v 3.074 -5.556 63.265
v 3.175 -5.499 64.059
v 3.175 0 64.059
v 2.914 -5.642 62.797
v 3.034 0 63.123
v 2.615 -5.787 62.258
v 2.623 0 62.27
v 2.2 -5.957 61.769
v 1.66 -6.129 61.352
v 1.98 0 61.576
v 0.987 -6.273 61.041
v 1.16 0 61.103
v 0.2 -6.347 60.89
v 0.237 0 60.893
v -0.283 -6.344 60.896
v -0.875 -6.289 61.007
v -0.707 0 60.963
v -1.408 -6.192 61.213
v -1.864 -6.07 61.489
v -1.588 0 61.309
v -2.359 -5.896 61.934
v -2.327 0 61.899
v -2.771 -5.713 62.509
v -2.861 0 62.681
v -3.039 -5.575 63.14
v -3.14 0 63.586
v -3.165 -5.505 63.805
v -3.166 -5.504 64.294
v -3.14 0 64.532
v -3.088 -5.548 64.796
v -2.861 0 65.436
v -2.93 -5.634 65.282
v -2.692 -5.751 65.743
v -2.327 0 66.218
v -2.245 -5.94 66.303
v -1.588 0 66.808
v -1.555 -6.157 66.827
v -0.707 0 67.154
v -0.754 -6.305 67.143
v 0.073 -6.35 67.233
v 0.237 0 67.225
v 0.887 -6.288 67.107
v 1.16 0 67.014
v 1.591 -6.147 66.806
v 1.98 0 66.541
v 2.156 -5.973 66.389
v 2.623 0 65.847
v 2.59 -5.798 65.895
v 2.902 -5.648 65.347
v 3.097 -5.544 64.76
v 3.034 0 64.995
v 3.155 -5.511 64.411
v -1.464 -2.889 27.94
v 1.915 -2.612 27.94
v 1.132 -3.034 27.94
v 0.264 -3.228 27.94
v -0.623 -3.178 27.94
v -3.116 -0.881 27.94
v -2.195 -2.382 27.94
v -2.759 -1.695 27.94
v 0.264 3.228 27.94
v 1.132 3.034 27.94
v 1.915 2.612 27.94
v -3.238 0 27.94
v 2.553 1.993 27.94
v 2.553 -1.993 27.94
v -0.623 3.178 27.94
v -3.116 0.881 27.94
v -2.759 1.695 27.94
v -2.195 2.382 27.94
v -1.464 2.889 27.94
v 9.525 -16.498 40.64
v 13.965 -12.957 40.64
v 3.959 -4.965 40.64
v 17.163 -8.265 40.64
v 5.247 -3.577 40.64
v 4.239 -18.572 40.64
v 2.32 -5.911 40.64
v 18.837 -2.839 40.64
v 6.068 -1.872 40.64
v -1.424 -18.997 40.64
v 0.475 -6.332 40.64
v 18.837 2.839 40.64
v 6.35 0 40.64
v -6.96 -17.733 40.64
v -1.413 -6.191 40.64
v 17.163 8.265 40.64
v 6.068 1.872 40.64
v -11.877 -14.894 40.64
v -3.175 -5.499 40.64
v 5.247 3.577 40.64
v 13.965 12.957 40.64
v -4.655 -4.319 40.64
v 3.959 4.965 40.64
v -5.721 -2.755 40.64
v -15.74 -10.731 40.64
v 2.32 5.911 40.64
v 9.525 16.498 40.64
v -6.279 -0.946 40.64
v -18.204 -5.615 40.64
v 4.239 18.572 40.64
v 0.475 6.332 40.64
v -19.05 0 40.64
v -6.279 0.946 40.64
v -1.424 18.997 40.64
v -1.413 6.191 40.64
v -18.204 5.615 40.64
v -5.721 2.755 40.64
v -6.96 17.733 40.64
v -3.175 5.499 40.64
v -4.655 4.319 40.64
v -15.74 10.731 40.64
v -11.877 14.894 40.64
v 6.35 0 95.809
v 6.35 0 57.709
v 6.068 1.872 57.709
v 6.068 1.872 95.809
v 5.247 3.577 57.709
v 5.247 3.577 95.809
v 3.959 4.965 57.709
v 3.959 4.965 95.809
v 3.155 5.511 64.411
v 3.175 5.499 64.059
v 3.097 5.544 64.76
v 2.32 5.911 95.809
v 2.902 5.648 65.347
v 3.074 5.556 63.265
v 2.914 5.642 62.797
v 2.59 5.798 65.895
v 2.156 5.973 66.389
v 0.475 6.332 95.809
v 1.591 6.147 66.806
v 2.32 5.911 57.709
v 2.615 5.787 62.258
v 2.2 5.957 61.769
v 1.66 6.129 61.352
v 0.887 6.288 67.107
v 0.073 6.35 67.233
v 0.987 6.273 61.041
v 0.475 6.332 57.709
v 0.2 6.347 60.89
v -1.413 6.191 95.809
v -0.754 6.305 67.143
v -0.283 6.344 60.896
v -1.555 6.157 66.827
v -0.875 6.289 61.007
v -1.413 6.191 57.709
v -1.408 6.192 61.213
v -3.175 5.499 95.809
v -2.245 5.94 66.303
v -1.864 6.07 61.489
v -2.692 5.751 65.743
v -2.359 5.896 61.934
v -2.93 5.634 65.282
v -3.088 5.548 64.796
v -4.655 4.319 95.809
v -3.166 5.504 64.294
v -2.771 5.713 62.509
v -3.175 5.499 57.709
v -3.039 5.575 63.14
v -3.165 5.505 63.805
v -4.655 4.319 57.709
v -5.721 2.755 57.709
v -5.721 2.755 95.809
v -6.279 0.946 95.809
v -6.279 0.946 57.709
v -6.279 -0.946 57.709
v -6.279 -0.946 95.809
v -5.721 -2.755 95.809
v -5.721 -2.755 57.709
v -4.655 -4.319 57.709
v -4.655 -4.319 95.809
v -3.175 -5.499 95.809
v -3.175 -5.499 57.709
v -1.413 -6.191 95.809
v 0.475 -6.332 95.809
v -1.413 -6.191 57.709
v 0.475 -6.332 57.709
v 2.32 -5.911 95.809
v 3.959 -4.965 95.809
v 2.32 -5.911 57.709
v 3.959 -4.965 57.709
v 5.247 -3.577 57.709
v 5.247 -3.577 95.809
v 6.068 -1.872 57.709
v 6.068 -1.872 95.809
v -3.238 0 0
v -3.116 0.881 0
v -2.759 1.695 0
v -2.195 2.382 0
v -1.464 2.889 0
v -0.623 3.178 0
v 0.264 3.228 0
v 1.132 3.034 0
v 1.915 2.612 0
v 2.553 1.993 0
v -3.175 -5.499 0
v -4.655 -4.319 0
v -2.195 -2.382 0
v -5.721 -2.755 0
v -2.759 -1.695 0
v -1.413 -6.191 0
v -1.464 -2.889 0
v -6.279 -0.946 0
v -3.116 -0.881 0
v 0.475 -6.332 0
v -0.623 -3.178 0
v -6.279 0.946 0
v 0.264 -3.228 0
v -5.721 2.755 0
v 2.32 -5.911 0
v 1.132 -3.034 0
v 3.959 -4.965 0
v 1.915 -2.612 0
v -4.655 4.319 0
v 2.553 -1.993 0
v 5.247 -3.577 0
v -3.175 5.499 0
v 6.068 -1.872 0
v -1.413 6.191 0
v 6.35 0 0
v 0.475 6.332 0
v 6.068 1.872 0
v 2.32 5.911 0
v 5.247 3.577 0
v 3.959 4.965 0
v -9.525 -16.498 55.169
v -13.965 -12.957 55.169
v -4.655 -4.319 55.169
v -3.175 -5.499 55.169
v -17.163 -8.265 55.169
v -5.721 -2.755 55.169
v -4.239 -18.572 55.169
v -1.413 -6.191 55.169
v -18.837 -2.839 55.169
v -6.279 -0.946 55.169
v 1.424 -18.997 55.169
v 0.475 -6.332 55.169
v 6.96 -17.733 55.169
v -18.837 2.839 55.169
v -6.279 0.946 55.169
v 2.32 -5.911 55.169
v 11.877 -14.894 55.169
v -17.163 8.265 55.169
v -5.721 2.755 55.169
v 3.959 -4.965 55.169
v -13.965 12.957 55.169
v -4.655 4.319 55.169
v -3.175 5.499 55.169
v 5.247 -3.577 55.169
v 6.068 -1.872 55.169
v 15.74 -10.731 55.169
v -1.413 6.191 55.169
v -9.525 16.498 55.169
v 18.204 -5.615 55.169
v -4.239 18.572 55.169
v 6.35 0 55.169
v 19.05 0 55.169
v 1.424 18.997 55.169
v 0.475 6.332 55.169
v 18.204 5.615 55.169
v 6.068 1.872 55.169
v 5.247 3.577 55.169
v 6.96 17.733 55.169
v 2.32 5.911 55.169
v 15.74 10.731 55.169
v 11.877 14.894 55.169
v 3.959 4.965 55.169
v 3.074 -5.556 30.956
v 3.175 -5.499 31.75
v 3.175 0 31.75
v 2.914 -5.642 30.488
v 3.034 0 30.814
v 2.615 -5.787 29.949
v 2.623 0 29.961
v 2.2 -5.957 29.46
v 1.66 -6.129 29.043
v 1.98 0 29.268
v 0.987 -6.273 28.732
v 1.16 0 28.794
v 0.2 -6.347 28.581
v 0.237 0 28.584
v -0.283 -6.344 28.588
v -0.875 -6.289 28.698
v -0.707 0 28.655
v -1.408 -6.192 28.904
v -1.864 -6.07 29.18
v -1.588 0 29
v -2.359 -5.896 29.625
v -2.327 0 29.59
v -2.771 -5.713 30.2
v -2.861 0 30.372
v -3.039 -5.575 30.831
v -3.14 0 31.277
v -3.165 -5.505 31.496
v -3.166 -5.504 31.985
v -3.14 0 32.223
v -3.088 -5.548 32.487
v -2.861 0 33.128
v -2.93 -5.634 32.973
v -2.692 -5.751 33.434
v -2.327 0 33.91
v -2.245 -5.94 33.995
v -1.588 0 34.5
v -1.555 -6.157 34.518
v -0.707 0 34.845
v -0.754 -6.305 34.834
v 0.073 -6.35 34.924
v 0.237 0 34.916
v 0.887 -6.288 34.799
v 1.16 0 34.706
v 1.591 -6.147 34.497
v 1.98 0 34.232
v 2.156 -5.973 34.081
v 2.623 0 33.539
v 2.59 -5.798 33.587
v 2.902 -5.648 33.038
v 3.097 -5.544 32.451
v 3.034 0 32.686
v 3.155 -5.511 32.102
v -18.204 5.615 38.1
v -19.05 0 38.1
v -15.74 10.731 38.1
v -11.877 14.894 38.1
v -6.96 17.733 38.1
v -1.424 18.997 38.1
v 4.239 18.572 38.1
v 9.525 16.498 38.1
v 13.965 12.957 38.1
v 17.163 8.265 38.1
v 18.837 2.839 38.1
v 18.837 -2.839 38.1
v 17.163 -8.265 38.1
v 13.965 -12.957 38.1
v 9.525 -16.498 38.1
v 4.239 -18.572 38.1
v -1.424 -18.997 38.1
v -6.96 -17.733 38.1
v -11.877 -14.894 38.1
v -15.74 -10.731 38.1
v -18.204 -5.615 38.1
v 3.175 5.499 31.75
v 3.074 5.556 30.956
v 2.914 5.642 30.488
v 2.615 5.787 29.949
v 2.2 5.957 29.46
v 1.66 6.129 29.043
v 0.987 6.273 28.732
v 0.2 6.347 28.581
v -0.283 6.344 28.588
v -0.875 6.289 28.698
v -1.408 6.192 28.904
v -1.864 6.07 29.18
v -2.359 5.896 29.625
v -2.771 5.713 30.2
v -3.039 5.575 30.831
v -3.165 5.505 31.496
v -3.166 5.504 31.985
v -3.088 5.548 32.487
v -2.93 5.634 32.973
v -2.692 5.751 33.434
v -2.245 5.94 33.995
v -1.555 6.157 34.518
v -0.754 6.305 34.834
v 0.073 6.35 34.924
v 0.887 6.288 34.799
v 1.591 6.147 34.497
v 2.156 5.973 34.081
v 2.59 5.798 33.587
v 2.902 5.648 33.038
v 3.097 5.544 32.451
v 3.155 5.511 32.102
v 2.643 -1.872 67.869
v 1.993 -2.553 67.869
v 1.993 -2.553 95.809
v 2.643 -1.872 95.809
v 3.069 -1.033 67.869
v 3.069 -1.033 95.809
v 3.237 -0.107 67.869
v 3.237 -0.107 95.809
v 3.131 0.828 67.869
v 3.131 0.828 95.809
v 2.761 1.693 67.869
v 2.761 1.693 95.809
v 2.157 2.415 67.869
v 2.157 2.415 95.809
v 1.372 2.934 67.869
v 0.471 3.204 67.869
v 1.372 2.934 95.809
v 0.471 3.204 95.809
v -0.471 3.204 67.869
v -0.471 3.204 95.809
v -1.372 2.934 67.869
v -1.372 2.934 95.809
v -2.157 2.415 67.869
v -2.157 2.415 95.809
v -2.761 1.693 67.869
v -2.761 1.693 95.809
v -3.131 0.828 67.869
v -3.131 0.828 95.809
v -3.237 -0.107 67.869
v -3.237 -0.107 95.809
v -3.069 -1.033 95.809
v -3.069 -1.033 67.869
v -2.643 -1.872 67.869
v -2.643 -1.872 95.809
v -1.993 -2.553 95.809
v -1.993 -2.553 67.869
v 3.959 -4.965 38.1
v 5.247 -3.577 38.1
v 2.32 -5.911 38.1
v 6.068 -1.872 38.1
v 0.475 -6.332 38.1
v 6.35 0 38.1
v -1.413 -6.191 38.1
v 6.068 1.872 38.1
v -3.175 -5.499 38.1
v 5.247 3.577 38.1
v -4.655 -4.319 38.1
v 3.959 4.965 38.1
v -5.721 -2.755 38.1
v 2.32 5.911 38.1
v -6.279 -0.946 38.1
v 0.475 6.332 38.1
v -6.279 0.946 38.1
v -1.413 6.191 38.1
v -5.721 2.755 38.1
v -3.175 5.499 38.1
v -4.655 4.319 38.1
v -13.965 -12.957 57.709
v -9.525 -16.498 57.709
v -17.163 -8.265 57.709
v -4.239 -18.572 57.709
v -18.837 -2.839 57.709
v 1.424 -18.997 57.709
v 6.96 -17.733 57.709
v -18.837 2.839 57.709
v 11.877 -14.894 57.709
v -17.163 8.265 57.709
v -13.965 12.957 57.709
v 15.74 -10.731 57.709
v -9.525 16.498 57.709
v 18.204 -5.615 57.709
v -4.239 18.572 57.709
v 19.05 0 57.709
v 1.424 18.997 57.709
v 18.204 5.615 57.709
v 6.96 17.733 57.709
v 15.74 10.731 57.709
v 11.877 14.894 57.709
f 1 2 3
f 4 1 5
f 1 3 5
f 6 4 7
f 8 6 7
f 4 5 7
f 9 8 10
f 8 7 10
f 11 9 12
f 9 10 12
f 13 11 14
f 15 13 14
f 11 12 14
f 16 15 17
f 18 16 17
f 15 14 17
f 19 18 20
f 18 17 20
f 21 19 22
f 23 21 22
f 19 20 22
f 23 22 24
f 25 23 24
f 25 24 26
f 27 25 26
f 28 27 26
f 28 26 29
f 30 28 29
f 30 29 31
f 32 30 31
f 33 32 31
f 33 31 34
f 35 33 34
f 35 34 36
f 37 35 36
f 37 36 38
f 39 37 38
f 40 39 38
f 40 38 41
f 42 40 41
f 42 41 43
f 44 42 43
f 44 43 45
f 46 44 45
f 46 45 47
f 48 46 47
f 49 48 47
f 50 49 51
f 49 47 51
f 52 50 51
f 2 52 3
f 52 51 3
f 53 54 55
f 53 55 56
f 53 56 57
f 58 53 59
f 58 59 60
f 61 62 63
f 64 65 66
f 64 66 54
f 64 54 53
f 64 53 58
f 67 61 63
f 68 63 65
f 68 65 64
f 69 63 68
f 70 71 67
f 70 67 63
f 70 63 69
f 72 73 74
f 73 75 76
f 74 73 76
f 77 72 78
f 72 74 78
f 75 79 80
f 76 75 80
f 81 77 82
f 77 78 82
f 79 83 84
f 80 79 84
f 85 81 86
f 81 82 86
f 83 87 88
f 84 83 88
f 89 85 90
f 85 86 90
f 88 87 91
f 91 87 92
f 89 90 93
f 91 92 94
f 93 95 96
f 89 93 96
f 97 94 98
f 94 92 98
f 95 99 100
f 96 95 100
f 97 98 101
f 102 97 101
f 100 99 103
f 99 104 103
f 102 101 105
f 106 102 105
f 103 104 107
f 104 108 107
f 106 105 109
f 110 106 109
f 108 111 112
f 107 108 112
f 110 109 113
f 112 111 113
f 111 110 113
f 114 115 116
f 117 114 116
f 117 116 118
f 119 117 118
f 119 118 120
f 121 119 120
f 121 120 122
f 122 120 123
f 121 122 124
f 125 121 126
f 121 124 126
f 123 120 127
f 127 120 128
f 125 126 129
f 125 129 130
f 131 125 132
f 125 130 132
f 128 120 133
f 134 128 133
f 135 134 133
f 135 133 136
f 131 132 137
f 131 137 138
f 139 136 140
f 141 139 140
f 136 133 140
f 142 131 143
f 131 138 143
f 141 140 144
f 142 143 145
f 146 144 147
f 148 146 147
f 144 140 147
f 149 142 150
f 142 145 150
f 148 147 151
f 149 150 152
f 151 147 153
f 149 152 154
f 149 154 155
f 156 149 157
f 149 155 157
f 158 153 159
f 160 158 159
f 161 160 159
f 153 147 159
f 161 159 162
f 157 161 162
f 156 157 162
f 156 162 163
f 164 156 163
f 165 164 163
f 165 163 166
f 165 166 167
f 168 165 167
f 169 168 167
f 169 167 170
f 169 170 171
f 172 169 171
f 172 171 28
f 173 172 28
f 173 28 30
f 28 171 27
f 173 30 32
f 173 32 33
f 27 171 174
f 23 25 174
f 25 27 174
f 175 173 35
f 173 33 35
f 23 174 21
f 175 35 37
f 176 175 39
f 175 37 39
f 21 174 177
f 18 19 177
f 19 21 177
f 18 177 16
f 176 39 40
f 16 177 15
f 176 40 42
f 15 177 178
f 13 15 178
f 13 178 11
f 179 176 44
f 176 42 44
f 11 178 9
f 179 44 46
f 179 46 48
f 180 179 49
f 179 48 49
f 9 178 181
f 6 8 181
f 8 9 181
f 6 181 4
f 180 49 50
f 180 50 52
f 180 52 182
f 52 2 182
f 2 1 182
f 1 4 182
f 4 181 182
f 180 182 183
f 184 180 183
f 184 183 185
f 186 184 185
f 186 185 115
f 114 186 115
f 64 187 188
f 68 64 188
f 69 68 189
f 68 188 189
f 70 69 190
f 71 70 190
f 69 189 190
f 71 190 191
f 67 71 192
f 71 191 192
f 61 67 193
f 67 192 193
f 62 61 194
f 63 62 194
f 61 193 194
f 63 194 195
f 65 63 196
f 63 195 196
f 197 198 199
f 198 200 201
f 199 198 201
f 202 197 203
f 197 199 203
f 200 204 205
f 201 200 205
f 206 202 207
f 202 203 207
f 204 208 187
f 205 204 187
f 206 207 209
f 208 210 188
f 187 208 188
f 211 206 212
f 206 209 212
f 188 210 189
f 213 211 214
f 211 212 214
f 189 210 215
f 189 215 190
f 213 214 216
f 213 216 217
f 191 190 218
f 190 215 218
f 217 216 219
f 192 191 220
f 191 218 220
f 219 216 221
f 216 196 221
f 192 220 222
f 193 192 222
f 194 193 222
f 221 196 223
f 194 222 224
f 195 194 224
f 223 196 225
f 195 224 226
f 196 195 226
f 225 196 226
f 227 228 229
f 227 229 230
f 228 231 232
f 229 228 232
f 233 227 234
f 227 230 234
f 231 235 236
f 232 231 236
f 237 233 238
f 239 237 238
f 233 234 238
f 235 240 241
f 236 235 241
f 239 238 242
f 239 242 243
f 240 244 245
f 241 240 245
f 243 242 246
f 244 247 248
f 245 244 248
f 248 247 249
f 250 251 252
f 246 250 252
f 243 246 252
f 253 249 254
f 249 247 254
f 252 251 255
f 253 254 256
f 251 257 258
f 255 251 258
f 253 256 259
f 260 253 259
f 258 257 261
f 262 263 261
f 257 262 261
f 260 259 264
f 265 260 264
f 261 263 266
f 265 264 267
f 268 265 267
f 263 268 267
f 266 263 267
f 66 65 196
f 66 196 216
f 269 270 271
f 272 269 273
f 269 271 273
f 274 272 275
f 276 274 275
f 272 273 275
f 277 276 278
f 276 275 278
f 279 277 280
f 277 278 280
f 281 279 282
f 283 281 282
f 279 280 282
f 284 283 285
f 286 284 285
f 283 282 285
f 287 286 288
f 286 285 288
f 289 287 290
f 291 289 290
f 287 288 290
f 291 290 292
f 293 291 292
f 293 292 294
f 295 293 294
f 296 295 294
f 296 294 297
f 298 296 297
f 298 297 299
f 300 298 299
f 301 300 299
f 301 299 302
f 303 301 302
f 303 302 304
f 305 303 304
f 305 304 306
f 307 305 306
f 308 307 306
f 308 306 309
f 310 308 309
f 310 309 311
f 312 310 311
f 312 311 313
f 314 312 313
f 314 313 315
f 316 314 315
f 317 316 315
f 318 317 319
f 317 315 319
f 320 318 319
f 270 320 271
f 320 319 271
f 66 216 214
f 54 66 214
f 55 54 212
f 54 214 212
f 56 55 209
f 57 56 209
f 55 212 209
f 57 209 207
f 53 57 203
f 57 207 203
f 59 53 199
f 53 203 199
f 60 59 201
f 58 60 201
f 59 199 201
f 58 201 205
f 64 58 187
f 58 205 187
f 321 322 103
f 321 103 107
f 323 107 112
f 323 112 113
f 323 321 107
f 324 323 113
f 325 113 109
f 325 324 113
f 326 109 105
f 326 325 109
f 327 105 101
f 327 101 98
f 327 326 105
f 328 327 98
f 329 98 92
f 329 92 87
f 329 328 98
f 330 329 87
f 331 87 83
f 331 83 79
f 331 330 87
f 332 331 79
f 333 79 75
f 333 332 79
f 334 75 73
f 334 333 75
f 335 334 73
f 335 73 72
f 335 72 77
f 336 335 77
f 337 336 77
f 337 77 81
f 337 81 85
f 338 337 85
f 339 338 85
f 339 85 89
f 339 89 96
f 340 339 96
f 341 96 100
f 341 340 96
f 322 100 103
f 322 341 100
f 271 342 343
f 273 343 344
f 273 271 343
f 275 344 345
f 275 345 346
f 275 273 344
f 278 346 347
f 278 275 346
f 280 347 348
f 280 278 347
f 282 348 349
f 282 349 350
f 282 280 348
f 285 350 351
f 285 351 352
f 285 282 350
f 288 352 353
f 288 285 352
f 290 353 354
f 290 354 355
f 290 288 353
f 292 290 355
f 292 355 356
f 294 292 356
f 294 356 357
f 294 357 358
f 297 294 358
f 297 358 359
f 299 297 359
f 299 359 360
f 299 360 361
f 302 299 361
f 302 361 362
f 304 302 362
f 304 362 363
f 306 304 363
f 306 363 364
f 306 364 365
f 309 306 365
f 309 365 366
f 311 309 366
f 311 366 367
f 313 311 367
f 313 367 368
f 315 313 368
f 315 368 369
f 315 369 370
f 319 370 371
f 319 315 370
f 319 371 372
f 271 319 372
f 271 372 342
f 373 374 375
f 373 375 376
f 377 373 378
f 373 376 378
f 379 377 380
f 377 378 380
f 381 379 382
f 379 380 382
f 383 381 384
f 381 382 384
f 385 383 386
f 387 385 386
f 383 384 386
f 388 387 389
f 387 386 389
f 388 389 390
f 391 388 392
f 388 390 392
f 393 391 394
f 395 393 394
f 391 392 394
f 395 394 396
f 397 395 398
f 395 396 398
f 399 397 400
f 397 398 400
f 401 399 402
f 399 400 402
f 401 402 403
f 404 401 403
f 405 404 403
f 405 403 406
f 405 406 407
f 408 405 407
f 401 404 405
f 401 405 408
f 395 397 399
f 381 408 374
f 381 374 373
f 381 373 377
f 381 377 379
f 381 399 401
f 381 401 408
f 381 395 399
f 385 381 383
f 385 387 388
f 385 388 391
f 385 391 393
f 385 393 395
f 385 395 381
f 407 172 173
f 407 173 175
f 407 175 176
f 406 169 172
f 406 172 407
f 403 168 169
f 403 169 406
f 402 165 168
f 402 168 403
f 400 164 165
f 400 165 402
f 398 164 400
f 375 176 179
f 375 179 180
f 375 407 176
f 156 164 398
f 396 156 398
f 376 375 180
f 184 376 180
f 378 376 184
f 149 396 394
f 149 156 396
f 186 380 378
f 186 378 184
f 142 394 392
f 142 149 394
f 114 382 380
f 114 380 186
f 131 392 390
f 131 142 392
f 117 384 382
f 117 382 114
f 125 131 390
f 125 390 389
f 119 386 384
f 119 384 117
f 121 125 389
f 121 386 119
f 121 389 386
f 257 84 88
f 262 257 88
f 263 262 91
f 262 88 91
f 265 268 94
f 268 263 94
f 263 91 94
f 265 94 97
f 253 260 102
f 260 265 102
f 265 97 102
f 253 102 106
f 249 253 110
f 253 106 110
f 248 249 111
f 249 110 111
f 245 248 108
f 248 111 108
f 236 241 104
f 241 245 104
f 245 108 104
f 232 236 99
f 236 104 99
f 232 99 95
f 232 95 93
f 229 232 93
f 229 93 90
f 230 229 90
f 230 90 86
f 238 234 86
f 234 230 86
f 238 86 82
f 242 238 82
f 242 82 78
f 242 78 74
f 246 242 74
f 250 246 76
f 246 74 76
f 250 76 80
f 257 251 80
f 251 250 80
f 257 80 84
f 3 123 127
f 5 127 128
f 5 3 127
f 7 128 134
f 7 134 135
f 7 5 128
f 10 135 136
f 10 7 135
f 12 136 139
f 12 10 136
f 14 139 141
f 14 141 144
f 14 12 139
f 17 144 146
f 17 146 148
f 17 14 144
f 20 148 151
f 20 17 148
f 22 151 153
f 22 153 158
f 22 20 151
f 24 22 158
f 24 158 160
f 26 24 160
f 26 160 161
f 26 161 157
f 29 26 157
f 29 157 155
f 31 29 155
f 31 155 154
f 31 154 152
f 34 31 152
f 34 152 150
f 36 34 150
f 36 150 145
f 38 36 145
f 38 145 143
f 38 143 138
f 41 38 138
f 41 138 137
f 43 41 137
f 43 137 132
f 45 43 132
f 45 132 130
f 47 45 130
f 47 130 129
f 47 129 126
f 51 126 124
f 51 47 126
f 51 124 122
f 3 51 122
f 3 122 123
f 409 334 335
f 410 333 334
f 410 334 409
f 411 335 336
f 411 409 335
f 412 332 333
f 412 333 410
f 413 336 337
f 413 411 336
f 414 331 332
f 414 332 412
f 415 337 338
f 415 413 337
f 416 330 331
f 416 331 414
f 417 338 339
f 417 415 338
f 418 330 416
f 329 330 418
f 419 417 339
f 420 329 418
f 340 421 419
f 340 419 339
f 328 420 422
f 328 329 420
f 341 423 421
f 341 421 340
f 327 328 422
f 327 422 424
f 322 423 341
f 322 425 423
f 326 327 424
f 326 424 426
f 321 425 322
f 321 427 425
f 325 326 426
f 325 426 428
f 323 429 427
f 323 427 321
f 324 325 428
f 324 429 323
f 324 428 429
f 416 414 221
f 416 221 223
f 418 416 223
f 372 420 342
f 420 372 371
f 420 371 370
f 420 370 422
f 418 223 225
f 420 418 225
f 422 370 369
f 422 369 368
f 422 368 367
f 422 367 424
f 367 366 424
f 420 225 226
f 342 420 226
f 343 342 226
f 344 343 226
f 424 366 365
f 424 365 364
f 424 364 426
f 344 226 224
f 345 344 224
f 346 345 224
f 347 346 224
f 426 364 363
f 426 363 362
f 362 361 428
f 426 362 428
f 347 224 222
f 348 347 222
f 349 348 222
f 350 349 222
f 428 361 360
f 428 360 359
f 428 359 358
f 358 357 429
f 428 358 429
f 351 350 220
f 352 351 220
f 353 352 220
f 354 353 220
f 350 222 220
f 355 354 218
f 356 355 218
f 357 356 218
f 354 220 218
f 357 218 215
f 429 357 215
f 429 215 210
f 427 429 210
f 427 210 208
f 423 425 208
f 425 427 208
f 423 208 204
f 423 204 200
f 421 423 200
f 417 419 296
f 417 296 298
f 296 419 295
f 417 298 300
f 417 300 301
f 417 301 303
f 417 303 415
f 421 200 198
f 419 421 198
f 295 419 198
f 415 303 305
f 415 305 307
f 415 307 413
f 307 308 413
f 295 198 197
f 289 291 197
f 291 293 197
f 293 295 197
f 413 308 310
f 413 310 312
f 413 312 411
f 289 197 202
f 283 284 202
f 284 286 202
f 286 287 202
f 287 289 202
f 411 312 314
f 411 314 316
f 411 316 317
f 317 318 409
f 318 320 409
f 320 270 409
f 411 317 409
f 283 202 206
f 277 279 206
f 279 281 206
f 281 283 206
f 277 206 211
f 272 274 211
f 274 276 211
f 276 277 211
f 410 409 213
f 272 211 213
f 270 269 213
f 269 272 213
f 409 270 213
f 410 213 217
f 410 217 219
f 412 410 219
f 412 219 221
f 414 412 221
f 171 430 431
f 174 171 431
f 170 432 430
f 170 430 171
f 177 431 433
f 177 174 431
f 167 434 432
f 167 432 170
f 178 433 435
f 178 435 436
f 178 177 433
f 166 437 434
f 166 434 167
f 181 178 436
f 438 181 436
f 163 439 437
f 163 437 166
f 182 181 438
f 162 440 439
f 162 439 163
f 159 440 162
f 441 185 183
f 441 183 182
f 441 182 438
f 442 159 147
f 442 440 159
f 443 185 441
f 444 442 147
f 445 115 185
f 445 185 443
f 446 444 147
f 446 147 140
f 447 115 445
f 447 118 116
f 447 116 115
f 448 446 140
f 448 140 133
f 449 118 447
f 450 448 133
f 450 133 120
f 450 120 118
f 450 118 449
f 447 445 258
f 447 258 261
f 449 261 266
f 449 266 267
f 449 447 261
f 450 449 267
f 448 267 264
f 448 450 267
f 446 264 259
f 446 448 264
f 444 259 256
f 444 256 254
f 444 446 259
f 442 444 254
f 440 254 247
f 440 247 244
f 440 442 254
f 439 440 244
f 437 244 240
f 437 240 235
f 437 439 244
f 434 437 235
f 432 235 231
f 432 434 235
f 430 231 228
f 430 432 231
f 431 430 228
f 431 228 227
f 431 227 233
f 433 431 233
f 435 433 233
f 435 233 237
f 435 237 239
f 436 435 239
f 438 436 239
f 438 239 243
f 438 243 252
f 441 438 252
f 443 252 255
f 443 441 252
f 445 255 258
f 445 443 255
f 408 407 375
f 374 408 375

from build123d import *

# Parameters (mm, degrees)
SKETCH1_R               = 6.35
BOSS_EXTRUDE1_DEPTH     = 95.8088
SKETCH4_R               = 3.175
CUT_EXTRUDE2_DEPTH      = 7.35
CUT_EXTRUDE2_DEPTH_BACK = 7.35
SKETCH5_R               = 19.05
BOSS_EXTRUDE2_DEPTH     = 2.54
SKETCH6_R               = 19.05
BOSS_EXTRUDE3_DEPTH     = 2.54
CUT_EXTRUDE4_DEPTH      = 27.94
CUT_EXTRUDE5_DEPTH      = 27.94


with BuildPart() as part:
    # Sketch1 → Boss-Extrude1 (new body)
    with BuildSketch(Plane.XY):
        Circle(SKETCH1_R)
    extrude(amount=BOSS_EXTRUDE1_DEPTH)

    # Sketch4 → Cut-Extrude2 (cut, two sides)
    with BuildSketch(Plane(origin=(0, 0, 0), x_dir=(1, 0, 0), z_dir=(0, 1, 0))) as cut_extrude2_sk:
        with Locations((0, -64.0588)):
            Circle(SKETCH4_R)
        with Locations((0, -31.75)):
            Circle(SKETCH4_R)
    extrude(amount=CUT_EXTRUDE2_DEPTH, mode=Mode.SUBTRACT)
    extrude(cut_extrude2_sk.sketch, amount=-CUT_EXTRUDE2_DEPTH_BACK, mode=Mode.SUBTRACT)

    # Sketch5 → Boss-Extrude2 (add)
    with BuildSketch(Plane.XY.offset(57.7088)):
        Circle(SKETCH5_R)
    extrude(amount=-BOSS_EXTRUDE2_DEPTH)

    # Sketch6 → Boss-Extrude3 (add)
    with BuildSketch(Plane(origin=(0, 0, 38.1), x_dir=(-1, 0, 0), z_dir=(0, 0, -1))):
        Circle(SKETCH6_R)
    extrude(amount=-BOSS_EXTRUDE3_DEPTH)

    # Sketch2 → Cut-Extrude4 (cut)
    with BuildSketch(Plane.XY.offset(95.8088)):
        with BuildLine():
            Line((-1.992888597, -2.5527), (1.992888597, -2.5527))
            ThreePointArc((1.992888597, -2.5527), (0, 3.2385), (-1.992888597, -2.5527))
        make_face()
    extrude(amount=-CUT_EXTRUDE4_DEPTH, mode=Mode.SUBTRACT)

    # Sketch7 → Cut-Extrude5 (cut)
    with BuildSketch(Plane(origin=(0, 0, 0), x_dir=(-1, 0, 0), z_dir=(0, 0, -1))):
        with BuildLine():
            Line((-2.5527, 1.992888597), (-2.5527, -1.992888597))
            ThreePointArc((-2.5527, -1.992888597), (1.053793931, -3.06225417), (3.2385, 0))
            ThreePointArc((3.2385, 0), (1.053793931, 3.06225417), (-2.5527, 1.992888597))
        make_face()
    extrude(amount=-CUT_EXTRUDE5_DEPTH, mode=Mode.SUBTRACT)


solid = part.part
